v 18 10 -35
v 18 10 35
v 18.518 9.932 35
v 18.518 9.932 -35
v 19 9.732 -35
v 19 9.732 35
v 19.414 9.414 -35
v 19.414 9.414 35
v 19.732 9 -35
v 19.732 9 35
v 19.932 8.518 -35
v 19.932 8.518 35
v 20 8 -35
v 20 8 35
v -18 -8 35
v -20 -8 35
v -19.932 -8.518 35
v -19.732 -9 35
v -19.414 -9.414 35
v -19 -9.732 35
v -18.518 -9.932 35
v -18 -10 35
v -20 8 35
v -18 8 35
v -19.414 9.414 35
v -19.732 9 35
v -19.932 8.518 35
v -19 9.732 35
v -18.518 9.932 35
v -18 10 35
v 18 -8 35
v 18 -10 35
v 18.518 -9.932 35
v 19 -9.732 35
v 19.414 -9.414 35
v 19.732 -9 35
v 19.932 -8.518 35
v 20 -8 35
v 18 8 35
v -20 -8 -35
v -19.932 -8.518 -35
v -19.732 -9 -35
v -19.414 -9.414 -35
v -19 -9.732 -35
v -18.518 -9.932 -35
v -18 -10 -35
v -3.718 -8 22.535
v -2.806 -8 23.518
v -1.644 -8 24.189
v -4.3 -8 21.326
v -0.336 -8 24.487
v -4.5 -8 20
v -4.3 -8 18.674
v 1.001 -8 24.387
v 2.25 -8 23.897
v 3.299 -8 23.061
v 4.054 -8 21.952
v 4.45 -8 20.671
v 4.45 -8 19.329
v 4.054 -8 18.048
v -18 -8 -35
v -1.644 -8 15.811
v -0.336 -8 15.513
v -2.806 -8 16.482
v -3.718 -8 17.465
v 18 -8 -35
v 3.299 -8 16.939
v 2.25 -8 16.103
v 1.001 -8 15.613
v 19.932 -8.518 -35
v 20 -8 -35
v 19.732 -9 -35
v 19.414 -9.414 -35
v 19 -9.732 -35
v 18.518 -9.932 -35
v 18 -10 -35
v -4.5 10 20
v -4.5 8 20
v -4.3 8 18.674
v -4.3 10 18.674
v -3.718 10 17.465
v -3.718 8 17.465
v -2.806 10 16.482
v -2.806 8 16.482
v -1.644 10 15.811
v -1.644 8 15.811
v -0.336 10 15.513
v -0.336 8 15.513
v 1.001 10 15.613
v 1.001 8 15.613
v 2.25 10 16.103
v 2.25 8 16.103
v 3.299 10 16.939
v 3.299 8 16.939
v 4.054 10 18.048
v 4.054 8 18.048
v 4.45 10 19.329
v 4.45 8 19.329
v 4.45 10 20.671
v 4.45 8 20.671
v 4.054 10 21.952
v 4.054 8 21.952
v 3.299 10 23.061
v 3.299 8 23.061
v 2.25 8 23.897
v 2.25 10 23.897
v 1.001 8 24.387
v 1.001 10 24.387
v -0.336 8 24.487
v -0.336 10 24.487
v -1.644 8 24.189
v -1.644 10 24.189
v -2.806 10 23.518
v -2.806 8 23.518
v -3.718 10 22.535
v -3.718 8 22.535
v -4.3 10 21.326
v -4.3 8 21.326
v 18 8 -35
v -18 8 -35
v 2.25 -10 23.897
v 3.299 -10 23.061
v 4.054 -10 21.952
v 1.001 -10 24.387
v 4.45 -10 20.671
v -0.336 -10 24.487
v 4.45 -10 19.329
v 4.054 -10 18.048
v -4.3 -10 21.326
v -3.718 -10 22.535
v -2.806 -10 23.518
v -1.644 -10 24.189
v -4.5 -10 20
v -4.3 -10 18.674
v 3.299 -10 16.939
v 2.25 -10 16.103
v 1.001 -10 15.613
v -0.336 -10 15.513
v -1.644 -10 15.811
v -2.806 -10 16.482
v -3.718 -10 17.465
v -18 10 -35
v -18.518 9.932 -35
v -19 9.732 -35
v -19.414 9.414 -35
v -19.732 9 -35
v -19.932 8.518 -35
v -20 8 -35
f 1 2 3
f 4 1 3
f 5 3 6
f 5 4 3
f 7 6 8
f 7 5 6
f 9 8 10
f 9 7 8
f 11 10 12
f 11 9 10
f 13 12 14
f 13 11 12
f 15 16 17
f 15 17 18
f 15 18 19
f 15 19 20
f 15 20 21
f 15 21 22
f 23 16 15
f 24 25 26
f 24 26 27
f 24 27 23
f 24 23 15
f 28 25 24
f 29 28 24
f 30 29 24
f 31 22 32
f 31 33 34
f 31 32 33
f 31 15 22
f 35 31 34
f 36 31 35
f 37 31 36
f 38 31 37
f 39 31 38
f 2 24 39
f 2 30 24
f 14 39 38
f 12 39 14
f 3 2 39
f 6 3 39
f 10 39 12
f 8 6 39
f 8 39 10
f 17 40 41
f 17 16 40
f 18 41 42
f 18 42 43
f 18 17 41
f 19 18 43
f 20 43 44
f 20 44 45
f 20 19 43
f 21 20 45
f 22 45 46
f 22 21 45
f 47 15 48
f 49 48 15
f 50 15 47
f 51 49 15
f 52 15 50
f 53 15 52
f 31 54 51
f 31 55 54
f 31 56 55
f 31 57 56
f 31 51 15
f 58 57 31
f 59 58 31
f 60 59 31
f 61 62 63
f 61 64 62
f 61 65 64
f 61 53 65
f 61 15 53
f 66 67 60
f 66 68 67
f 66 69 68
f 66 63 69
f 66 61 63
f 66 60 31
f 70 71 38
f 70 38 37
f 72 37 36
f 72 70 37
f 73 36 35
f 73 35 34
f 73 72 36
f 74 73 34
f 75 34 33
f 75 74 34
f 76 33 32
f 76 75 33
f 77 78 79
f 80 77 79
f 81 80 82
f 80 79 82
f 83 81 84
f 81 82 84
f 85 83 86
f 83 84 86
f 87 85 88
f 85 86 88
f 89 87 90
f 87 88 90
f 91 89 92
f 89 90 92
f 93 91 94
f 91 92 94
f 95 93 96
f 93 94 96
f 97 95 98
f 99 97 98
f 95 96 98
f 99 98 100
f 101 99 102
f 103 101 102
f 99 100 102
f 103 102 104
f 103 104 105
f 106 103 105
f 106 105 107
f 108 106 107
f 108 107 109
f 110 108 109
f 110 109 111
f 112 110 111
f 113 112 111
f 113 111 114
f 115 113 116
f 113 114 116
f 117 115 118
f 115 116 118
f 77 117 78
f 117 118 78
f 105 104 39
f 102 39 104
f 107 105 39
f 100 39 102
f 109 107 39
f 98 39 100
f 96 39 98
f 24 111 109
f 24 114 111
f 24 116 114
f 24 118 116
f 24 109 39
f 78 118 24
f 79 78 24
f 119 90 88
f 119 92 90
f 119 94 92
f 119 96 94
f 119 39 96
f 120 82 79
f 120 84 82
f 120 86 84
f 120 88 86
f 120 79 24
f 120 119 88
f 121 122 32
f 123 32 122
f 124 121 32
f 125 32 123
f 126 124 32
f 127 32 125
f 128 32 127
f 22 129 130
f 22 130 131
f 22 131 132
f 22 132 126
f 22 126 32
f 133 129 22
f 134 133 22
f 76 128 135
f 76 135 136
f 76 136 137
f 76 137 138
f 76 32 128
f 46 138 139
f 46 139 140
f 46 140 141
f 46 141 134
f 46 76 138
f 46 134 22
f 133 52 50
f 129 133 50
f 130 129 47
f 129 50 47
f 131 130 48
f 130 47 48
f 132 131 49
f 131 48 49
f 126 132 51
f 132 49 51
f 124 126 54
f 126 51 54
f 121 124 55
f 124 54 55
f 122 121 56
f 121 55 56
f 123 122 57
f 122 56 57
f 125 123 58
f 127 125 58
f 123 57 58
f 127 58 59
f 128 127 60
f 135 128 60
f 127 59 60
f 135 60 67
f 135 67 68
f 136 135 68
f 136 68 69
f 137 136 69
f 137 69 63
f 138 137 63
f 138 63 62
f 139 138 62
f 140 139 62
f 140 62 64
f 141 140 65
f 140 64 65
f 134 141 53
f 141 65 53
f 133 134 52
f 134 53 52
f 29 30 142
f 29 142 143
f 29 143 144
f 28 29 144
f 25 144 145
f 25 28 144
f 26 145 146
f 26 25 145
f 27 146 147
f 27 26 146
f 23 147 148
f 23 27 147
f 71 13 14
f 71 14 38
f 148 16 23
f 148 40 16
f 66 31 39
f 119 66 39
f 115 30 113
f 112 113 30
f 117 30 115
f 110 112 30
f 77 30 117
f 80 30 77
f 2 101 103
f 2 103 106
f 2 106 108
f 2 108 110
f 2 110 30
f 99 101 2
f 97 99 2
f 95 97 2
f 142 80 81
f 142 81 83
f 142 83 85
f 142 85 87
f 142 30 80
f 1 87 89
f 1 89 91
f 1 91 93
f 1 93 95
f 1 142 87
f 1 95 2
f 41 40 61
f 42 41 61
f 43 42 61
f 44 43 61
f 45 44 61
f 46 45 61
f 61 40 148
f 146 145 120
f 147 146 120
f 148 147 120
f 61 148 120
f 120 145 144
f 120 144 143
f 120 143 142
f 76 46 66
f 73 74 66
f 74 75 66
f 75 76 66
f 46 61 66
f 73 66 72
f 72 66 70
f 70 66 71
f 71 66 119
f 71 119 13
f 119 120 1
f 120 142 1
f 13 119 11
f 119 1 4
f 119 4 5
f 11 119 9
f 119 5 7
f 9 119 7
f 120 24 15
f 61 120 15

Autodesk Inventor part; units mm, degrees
ref_plane "YZ Plane" through (0, 0, 0) normal (1, 0, 0) x (0, 1, 0)
ref_plane "XZ Plane" through (0, 0, 0) normal (0, 1, 0) x (-1, 0, 0)
ref_plane "XY Plane" through (0, 0, 0) normal (0, 0, 1) x (1, 0, 0)
sketch "Sketch1" plane through (0, 0, 0) normal (0, 0, 1) x (1, 0, 0)
  line L0 (-20, 10) -> (20, 10)
  line L1 (20, 10) -> (20, -10)
  line L2 (20, -10) -> (-20, -10)
  line L3 (-20, -10) -> (-20, 10)
  line L4 (-20, 10) -> (20, -10) construction
  line L5 (20, 10) -> (-20, -10) construction
  line L6 (18, 8) -> (-18, 8)
  line L7 (-18, 8) -> (-18, -8)
  line L8 (-18, -8) -> (18, -8)
  line L9 (18, -8) -> (18, 8)
  point P0 (0, 0)
  dimension "d0" = 40
  dimension "d1" = 20
  dimension "d2" = 2
extrude "Extrusion1" add sketch "Sketch1" along normal mid plane 70
fillet "Fillet1" radius 2 4 edges at (-20, 10, 0) (-20, -10, 0) (20, -10, 0) (20, 10, 0)
sketch "Sketch4" plane through (0, 0, 0) normal (0, 1, 0) x (-1, 0, 0)
  line L0 (18, 35) -> (-18, 35) projected
  line L1 (-18, -35) -> (18, -35) projected
  circle A0 centre (0, 20) radius 4.5
  circle A1 centre (0, -20) radius 4.5
  line L2 (48.8004, 0) -> (-48.8004, 0) construction
  point P0 (0, 0)
  point P1 (0, 0)
  dimension "d20" = 9
  dimension "d21" = 15
extrude "Extrusion4" cut sketch "Sketch4" along normal through all both and the other way through all contours A0
properties part number "Leg tube 3"
